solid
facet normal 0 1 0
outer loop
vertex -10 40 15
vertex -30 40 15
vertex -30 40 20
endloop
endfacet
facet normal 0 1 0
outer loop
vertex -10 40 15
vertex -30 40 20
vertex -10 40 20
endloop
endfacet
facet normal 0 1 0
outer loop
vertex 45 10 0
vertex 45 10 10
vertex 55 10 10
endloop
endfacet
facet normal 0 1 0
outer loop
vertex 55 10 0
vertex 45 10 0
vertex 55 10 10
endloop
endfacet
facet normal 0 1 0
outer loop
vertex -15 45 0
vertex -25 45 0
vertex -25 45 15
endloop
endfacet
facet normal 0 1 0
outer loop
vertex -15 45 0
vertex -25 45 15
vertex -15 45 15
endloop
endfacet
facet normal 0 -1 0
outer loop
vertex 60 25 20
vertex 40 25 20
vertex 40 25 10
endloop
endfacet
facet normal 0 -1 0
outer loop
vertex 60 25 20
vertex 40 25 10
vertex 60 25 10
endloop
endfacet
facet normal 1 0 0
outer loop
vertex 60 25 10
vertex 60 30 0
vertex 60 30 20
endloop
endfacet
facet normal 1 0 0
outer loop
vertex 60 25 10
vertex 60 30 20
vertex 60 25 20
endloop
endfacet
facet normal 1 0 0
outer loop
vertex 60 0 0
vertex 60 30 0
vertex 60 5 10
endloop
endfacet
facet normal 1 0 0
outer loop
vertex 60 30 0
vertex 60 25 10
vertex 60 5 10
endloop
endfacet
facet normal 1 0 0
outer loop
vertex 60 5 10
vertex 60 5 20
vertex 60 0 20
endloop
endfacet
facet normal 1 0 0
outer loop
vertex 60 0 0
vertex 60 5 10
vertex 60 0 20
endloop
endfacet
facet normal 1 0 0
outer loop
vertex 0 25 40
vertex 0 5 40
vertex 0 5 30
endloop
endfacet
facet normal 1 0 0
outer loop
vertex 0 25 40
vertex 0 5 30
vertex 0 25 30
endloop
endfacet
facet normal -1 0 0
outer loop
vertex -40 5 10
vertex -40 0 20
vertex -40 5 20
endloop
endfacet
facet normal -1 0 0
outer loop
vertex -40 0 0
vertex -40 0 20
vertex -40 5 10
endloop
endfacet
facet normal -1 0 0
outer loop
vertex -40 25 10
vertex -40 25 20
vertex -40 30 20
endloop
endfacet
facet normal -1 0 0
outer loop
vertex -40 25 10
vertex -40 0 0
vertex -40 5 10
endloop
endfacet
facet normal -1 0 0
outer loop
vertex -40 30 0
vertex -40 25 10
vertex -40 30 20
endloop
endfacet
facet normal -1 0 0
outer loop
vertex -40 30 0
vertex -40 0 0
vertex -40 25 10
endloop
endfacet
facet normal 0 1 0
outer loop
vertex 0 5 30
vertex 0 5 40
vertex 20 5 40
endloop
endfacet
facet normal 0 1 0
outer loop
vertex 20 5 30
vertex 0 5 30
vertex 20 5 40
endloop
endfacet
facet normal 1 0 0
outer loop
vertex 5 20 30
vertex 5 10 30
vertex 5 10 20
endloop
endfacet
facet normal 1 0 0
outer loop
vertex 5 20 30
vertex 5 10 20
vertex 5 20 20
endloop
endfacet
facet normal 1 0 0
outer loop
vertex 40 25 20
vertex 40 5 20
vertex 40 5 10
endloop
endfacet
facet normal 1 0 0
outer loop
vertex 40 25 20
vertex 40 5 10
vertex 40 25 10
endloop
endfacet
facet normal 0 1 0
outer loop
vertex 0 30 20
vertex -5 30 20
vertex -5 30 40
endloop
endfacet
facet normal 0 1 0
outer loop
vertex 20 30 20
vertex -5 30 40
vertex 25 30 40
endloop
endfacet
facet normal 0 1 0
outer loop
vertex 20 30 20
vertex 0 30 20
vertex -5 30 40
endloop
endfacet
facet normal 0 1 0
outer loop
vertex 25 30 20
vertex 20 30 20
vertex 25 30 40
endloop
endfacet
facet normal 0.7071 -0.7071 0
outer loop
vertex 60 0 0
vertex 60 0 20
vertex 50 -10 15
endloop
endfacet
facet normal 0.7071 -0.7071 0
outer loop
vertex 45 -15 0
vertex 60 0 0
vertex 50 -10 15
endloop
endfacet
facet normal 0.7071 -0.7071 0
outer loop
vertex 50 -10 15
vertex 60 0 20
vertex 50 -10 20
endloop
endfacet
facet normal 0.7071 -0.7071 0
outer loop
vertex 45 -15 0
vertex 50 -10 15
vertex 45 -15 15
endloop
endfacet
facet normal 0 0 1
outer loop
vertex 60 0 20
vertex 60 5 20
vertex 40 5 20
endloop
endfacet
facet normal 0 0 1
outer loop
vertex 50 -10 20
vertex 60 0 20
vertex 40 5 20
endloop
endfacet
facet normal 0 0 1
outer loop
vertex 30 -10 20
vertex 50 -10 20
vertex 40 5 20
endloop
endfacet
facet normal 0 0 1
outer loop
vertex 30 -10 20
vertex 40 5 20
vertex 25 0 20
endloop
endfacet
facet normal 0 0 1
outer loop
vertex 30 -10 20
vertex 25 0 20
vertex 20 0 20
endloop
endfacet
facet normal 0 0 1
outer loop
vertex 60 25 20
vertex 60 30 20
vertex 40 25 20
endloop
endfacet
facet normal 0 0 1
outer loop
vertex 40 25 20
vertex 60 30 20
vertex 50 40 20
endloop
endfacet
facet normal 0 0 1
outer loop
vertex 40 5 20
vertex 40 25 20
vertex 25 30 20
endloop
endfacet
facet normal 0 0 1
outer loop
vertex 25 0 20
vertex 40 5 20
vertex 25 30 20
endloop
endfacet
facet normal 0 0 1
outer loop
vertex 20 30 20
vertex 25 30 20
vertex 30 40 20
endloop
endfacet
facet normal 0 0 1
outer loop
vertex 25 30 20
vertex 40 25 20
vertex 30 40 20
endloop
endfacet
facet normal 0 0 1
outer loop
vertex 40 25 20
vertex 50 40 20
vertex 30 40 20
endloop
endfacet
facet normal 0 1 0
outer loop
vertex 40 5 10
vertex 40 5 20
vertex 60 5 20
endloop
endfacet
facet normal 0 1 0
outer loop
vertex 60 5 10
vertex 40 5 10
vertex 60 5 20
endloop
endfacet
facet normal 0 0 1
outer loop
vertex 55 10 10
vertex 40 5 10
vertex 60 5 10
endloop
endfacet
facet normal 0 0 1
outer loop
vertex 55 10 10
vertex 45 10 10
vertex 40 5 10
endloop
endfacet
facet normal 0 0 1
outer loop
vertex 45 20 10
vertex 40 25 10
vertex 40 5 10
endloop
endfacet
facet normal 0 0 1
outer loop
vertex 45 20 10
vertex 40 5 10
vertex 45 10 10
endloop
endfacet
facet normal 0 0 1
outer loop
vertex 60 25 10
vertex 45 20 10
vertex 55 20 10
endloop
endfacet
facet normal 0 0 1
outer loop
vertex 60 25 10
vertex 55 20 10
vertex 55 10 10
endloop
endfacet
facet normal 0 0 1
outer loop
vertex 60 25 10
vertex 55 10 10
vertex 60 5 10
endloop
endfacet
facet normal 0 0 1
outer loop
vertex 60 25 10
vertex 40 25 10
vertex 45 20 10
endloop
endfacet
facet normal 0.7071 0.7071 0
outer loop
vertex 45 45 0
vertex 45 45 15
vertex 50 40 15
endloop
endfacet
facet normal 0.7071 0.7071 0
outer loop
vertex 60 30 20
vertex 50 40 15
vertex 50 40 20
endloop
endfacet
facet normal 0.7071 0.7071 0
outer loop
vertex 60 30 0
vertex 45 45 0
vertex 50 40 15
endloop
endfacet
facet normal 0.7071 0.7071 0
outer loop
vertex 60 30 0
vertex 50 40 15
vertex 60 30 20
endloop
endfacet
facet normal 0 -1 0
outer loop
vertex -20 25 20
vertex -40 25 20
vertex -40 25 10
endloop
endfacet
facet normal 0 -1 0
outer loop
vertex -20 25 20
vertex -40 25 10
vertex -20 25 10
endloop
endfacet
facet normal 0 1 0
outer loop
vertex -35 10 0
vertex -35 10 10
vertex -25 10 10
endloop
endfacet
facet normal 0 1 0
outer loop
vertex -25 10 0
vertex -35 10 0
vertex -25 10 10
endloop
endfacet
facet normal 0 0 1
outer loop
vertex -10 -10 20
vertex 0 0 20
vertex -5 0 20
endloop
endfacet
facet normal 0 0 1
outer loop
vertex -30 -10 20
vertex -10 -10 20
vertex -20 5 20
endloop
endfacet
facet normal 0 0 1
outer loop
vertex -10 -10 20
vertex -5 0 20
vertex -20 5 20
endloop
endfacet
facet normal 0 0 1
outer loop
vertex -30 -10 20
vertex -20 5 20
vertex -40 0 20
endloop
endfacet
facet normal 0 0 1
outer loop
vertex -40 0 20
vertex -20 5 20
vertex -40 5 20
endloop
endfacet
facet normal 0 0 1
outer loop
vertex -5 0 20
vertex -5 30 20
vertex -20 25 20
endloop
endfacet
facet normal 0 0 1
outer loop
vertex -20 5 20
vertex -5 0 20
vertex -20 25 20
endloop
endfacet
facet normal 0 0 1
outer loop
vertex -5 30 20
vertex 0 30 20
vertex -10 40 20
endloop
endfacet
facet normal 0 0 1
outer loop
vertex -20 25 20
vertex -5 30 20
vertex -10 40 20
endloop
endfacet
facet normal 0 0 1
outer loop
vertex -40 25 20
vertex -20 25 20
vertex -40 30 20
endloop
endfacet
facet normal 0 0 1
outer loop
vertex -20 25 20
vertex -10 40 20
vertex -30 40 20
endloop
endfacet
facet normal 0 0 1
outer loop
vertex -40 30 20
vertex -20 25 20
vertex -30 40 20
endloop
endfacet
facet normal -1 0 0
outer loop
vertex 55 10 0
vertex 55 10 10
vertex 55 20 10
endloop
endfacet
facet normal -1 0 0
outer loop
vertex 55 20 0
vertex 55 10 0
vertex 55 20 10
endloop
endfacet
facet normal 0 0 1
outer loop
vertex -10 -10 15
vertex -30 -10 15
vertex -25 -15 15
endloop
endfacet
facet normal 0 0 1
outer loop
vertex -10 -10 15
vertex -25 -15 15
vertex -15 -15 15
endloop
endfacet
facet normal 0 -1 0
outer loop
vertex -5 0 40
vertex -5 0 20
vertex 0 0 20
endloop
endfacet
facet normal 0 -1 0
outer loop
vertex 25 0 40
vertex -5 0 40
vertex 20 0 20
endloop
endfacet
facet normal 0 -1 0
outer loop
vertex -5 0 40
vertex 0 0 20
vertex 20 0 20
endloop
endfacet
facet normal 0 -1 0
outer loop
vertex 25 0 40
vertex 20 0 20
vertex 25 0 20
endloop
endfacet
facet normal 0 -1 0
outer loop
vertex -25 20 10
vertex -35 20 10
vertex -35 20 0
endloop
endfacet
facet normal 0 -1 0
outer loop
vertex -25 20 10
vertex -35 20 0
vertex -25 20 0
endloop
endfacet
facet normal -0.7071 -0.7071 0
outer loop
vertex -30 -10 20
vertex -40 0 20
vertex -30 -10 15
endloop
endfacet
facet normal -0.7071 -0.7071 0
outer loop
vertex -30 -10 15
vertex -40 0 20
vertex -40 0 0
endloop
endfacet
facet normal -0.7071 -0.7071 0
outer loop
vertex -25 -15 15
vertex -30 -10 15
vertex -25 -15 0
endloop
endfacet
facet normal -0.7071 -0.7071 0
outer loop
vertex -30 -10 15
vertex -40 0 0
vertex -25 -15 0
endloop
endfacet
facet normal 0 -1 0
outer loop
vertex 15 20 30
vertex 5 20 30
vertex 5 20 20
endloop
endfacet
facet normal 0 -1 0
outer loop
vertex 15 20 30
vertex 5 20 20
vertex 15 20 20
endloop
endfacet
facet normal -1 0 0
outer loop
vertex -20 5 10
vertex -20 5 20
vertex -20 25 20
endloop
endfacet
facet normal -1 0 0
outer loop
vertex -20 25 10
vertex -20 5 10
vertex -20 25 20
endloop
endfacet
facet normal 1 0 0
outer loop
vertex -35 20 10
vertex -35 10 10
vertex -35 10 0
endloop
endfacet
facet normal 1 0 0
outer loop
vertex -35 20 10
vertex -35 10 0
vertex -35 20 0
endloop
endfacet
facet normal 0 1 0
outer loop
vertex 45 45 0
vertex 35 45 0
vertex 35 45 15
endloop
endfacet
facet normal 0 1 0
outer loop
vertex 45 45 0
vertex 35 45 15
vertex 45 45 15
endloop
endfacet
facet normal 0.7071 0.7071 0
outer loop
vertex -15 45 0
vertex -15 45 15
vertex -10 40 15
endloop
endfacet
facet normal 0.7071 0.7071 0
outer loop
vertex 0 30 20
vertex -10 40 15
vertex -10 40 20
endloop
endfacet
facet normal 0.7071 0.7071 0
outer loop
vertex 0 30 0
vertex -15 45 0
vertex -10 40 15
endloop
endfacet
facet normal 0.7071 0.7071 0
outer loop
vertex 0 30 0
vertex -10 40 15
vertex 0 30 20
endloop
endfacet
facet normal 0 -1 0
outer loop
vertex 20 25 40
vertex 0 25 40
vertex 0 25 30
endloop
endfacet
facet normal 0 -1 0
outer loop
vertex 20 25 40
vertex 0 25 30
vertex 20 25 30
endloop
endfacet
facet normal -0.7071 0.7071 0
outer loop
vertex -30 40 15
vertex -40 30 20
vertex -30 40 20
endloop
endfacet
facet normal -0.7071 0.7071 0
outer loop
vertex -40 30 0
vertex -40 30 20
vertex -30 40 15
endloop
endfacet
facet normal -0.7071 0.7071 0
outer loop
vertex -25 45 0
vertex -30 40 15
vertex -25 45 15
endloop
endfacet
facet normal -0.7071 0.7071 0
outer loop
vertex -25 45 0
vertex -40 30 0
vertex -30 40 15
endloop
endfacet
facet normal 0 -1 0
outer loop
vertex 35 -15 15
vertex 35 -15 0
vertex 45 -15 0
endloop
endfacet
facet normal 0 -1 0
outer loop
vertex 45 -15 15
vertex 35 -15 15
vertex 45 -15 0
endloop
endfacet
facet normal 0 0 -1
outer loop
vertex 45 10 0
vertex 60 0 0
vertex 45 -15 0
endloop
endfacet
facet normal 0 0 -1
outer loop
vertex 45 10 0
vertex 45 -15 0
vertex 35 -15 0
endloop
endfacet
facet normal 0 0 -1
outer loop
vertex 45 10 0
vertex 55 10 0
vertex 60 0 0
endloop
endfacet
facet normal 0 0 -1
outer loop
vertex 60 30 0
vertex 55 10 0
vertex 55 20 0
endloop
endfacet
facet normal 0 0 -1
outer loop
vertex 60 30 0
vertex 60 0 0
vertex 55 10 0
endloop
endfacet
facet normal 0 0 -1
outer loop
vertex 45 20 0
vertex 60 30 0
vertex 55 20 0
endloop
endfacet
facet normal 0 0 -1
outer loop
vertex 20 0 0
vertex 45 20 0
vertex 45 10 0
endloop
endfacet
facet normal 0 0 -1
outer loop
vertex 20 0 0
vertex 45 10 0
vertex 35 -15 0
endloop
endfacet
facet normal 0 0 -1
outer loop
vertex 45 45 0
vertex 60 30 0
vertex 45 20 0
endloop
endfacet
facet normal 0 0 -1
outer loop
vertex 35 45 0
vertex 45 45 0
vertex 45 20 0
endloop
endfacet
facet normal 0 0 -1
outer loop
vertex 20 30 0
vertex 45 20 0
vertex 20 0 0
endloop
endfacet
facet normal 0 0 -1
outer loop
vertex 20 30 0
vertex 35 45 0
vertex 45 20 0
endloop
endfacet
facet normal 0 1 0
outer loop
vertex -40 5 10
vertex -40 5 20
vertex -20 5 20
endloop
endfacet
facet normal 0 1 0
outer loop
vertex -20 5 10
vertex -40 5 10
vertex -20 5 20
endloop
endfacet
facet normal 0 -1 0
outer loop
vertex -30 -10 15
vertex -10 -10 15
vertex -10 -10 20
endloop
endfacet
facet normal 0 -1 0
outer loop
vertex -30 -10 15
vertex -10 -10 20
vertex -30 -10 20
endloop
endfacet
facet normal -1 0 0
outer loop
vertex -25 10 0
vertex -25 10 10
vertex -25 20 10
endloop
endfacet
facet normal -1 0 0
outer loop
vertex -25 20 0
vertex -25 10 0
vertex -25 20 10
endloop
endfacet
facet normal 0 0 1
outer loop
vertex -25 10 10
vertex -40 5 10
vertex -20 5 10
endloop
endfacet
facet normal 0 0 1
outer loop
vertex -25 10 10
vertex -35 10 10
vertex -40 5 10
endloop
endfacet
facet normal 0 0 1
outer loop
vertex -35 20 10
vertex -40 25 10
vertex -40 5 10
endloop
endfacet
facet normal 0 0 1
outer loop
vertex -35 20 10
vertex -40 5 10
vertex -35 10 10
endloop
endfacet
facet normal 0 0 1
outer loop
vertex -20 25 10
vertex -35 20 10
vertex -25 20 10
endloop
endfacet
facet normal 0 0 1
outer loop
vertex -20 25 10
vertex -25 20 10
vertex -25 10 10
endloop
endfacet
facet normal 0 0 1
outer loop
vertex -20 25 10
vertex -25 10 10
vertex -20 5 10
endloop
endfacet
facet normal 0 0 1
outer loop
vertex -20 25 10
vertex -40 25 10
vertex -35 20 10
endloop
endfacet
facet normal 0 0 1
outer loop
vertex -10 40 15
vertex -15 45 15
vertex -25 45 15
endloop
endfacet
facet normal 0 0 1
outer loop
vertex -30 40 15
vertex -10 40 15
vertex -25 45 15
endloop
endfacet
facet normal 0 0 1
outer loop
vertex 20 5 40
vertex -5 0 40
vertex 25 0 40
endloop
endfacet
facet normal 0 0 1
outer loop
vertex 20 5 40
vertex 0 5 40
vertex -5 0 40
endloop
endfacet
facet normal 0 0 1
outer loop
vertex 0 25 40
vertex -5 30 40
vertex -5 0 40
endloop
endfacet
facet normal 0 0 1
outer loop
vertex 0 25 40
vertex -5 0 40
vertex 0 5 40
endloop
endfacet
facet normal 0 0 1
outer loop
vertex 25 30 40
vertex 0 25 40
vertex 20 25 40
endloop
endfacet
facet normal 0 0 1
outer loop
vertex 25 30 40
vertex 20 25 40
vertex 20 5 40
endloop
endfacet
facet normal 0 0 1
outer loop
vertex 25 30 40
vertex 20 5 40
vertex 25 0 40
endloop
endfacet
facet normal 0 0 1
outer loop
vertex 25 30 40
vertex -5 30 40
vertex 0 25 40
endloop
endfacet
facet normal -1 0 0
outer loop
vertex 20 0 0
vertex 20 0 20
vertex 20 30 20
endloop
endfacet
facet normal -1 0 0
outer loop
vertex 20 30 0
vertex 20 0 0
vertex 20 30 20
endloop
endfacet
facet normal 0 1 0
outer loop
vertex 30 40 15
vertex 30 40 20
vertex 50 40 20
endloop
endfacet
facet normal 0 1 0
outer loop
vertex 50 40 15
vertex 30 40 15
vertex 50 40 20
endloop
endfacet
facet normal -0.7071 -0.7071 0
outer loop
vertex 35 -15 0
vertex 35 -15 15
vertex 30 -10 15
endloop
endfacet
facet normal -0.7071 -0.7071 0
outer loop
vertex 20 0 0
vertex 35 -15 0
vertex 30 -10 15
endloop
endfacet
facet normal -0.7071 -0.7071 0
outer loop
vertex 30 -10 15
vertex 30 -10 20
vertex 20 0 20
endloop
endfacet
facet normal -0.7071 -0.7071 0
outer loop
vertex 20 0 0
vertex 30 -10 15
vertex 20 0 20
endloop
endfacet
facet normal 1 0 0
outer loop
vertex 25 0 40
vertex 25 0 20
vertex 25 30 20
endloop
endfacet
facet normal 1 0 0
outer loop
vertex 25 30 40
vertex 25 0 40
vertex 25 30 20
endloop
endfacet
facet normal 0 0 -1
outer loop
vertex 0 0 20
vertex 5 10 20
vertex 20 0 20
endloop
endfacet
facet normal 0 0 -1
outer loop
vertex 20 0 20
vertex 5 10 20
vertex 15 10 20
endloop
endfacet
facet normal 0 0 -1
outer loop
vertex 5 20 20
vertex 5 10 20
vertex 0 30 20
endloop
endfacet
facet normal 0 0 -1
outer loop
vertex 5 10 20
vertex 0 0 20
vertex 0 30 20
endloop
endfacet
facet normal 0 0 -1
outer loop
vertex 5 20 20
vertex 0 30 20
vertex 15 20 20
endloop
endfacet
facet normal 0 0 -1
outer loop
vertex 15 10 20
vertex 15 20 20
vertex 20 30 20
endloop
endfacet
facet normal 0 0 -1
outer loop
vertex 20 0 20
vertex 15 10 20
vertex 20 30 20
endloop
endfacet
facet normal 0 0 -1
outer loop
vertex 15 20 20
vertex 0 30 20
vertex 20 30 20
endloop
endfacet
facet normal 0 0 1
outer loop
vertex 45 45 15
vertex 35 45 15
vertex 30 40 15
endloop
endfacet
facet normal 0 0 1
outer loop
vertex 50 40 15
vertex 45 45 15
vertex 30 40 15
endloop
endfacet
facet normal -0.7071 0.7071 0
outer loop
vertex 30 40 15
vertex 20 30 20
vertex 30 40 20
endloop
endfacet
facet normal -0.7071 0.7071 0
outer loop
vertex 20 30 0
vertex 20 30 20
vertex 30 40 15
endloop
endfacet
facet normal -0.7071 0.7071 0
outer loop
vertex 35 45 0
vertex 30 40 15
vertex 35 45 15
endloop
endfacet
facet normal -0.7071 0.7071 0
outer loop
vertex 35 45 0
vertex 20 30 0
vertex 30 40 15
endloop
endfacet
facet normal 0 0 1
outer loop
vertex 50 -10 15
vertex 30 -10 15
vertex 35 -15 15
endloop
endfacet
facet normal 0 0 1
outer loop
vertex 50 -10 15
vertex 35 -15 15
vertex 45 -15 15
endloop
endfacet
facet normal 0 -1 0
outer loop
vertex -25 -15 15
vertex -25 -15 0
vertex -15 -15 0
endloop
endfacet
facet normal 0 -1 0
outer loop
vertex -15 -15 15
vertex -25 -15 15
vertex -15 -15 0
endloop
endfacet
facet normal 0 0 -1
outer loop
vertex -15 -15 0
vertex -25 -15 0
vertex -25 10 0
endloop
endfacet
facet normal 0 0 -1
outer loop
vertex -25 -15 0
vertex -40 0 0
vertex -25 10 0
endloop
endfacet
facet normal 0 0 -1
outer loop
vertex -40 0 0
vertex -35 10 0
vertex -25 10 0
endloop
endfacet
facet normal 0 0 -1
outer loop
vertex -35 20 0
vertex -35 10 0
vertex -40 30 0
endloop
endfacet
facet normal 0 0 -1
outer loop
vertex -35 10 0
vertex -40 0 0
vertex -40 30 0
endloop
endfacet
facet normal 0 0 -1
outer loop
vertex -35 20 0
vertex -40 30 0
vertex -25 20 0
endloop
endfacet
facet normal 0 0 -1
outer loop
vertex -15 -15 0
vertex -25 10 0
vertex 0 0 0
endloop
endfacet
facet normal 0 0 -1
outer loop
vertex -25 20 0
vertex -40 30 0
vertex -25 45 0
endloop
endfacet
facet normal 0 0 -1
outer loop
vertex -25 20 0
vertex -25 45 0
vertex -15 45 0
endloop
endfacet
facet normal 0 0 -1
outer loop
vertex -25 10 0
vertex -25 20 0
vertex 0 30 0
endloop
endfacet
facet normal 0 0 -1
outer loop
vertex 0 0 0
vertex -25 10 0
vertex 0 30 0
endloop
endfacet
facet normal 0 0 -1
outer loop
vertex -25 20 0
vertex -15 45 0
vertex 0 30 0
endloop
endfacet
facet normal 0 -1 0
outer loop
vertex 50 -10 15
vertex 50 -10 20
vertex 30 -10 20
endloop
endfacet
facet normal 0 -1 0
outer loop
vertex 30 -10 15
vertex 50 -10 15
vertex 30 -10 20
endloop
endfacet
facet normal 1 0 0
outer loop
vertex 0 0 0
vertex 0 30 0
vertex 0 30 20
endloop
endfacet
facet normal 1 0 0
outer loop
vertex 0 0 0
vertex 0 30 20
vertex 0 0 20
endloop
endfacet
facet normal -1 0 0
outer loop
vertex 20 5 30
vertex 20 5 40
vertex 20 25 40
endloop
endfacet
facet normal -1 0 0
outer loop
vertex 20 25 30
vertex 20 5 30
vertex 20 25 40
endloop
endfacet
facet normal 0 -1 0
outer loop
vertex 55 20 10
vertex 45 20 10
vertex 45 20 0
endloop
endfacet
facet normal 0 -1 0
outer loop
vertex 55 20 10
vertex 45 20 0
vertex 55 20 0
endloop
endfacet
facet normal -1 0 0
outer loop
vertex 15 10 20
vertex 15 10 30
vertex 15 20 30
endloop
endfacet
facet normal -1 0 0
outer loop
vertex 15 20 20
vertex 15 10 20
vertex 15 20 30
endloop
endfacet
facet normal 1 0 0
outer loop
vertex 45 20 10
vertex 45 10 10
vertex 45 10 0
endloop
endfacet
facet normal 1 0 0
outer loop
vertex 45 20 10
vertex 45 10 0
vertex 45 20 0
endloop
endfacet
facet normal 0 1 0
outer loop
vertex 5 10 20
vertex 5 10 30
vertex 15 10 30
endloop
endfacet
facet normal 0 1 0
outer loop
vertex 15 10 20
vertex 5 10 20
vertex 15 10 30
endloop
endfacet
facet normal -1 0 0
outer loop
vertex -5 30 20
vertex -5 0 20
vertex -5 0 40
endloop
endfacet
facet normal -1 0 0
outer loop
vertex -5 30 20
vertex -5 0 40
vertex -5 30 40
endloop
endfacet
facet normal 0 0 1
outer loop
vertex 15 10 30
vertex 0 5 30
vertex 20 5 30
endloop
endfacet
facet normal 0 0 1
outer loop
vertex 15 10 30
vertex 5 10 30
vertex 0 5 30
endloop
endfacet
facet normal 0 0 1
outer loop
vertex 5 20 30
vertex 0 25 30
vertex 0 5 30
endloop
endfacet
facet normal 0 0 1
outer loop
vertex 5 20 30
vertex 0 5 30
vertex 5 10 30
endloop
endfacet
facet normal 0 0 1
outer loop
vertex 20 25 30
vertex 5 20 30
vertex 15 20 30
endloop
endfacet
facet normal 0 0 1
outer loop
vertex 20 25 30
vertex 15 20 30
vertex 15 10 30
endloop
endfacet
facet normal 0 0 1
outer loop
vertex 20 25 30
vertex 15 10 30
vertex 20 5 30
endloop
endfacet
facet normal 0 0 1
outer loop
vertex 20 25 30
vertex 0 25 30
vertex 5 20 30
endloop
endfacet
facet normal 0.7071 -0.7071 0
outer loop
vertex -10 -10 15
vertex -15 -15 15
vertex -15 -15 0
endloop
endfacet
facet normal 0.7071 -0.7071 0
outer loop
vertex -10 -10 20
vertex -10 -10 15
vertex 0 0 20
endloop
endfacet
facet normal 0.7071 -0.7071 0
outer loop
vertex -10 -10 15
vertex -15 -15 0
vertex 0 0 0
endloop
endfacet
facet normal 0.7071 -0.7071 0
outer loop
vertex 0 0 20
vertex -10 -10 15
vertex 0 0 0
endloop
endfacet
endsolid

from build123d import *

# Parameters (mm, degrees)
BOSS_EXTRUDE1_DEPTH = 20
SKETCH2_W           = 20
SKETCH2_H           = 20
CUT_EXTRUDE1_DEPTH  = 10
SKETCH3_W           = 10
SKETCH3_H           = 10
CUT_EXTRUDE2_DEPTH  = 194
BOSS_EXTRUDE3_DEPTH = 15
SKETCH6_W           = 30
SKETCH6_H           = 30
BOSS_EXTRUDE4_DEPTH = 20
SKETCH7_W           = 20
SKETCH7_H           = 20
CUT_EXTRUDE3_DEPTH  = 10
SKETCH8_W           = 10
SKETCH8_H           = 10
CUT_EXTRUDE4_DEPTH  = 41
BOSS_EXTRUDE7_DEPTH = 20
BOSS_EXTRUDE8_DEPTH = 15
SKETCH12_W          = 20
SKETCH12_H          = 20
CUT_EXTRUDE5_DEPTH  = 10
SKETCH13_W          = 10
SKETCH13_H          = 10
CUT_EXTRUDE6_DEPTH  = 31


with BuildPart() as part:
    # Sketch1 → Boss-Extrude1 (new body)
    with BuildSketch(Plane.XY):
        Polygon((-40, 0), (-40, 30), (-30, 40), (-10, 40), (0, 30), (0, 0), (-10, -10), (-30, -10), align=None)
    extrude(amount=BOSS_EXTRUDE1_DEPTH)

    # Sketch2 → Cut-Extrude1 (cut)
    with BuildSketch(Plane.XY.offset(20)):
        with Locations((-30, 15)):
            Rectangle(SKETCH2_W, SKETCH2_H)
    extrude(amount=-CUT_EXTRUDE1_DEPTH, mode=Mode.SUBTRACT)

    # Sketch3 → Cut-Extrude2 (cut)
    with BuildSketch(Plane.XY.offset(10)):
        with Locations((-30, 15)):
            Rectangle(SKETCH3_W, SKETCH3_H)
    extrude(amount=-CUT_EXTRUDE2_DEPTH, mode=Mode.SUBTRACT)

    # Sketch5 → Boss-Extrude3 (add)
    with BuildSketch(Plane(origin=(0, 0, 0), x_dir=(-1, 0, 0), z_dir=(0, 0, -1))):
        Polygon((30, -10), (25, -15), (15, -15), (10, -10), align=None)
        Polygon((30, 40), (25, 45), (15, 45), (10, 40), align=None)
    extrude(amount=-BOSS_EXTRUDE3_DEPTH)

    # Sketch6 → Boss-Extrude4 (add)
    with BuildSketch(Plane.XY.offset(20)):
        with Locations((10, 15)):
            Rectangle(SKETCH6_W, SKETCH6_H)
    extrude(amount=BOSS_EXTRUDE4_DEPTH)

    # Sketch7 → Cut-Extrude3 (cut)
    with BuildSketch(Plane.XY.offset(40)):
        with Locations((10, 15)):
            Rectangle(SKETCH7_W, SKETCH7_H)
    extrude(amount=-CUT_EXTRUDE3_DEPTH, mode=Mode.SUBTRACT)

    # Sketch8 → Cut-Extrude4 (cut)
    with BuildSketch(Plane.XY.offset(30)):
        with Locations((10, 15)):
            Rectangle(SKETCH8_W, SKETCH8_H)
    extrude(amount=-CUT_EXTRUDE4_DEPTH, mode=Mode.SUBTRACT)

    # Sketch10 → Boss-Extrude7 (add)
    with BuildSketch(Plane(origin=(0, 0, 20), x_dir=(-1, 0, 0), z_dir=(0, 0, -1))):
        Polygon((-20, 30), (-30, 40), (-50, 40), (-60, 30), (-60, 0), (-50, -10), (-30, -10), (-20, 0), align=None)
    extrude(amount=BOSS_EXTRUDE7_DEPTH)

    # Sketch11 → Boss-Extrude8 (add)
    with BuildSketch(Plane(origin=(0, 0, 0), x_dir=(-1, 0, 0), z_dir=(0, 0, -1))):
        Polygon((-35, 45), (-45, 45), (-50, 40), (-30, 40), align=None)
        Polygon((-50, -10), (-30, -10), (-35, -15), (-45, -15), align=None)
    extrude(amount=-BOSS_EXTRUDE8_DEPTH)

    # Sketch12 → Cut-Extrude5 (cut)
    with BuildSketch(Plane.XY.offset(20)):
        with Locations((50, 15)):
            Rectangle(SKETCH12_W, SKETCH12_H)
    extrude(amount=-CUT_EXTRUDE5_DEPTH, mode=Mode.SUBTRACT)

    # Sketch13 → Cut-Extrude6 (cut)
    with BuildSketch(Plane.XY.offset(10)):
        with Locations((50, 15)):
            Rectangle(SKETCH13_W, SKETCH13_H)
    extrude(amount=-CUT_EXTRUDE6_DEPTH, mode=Mode.SUBTRACT)


solid = part.part
